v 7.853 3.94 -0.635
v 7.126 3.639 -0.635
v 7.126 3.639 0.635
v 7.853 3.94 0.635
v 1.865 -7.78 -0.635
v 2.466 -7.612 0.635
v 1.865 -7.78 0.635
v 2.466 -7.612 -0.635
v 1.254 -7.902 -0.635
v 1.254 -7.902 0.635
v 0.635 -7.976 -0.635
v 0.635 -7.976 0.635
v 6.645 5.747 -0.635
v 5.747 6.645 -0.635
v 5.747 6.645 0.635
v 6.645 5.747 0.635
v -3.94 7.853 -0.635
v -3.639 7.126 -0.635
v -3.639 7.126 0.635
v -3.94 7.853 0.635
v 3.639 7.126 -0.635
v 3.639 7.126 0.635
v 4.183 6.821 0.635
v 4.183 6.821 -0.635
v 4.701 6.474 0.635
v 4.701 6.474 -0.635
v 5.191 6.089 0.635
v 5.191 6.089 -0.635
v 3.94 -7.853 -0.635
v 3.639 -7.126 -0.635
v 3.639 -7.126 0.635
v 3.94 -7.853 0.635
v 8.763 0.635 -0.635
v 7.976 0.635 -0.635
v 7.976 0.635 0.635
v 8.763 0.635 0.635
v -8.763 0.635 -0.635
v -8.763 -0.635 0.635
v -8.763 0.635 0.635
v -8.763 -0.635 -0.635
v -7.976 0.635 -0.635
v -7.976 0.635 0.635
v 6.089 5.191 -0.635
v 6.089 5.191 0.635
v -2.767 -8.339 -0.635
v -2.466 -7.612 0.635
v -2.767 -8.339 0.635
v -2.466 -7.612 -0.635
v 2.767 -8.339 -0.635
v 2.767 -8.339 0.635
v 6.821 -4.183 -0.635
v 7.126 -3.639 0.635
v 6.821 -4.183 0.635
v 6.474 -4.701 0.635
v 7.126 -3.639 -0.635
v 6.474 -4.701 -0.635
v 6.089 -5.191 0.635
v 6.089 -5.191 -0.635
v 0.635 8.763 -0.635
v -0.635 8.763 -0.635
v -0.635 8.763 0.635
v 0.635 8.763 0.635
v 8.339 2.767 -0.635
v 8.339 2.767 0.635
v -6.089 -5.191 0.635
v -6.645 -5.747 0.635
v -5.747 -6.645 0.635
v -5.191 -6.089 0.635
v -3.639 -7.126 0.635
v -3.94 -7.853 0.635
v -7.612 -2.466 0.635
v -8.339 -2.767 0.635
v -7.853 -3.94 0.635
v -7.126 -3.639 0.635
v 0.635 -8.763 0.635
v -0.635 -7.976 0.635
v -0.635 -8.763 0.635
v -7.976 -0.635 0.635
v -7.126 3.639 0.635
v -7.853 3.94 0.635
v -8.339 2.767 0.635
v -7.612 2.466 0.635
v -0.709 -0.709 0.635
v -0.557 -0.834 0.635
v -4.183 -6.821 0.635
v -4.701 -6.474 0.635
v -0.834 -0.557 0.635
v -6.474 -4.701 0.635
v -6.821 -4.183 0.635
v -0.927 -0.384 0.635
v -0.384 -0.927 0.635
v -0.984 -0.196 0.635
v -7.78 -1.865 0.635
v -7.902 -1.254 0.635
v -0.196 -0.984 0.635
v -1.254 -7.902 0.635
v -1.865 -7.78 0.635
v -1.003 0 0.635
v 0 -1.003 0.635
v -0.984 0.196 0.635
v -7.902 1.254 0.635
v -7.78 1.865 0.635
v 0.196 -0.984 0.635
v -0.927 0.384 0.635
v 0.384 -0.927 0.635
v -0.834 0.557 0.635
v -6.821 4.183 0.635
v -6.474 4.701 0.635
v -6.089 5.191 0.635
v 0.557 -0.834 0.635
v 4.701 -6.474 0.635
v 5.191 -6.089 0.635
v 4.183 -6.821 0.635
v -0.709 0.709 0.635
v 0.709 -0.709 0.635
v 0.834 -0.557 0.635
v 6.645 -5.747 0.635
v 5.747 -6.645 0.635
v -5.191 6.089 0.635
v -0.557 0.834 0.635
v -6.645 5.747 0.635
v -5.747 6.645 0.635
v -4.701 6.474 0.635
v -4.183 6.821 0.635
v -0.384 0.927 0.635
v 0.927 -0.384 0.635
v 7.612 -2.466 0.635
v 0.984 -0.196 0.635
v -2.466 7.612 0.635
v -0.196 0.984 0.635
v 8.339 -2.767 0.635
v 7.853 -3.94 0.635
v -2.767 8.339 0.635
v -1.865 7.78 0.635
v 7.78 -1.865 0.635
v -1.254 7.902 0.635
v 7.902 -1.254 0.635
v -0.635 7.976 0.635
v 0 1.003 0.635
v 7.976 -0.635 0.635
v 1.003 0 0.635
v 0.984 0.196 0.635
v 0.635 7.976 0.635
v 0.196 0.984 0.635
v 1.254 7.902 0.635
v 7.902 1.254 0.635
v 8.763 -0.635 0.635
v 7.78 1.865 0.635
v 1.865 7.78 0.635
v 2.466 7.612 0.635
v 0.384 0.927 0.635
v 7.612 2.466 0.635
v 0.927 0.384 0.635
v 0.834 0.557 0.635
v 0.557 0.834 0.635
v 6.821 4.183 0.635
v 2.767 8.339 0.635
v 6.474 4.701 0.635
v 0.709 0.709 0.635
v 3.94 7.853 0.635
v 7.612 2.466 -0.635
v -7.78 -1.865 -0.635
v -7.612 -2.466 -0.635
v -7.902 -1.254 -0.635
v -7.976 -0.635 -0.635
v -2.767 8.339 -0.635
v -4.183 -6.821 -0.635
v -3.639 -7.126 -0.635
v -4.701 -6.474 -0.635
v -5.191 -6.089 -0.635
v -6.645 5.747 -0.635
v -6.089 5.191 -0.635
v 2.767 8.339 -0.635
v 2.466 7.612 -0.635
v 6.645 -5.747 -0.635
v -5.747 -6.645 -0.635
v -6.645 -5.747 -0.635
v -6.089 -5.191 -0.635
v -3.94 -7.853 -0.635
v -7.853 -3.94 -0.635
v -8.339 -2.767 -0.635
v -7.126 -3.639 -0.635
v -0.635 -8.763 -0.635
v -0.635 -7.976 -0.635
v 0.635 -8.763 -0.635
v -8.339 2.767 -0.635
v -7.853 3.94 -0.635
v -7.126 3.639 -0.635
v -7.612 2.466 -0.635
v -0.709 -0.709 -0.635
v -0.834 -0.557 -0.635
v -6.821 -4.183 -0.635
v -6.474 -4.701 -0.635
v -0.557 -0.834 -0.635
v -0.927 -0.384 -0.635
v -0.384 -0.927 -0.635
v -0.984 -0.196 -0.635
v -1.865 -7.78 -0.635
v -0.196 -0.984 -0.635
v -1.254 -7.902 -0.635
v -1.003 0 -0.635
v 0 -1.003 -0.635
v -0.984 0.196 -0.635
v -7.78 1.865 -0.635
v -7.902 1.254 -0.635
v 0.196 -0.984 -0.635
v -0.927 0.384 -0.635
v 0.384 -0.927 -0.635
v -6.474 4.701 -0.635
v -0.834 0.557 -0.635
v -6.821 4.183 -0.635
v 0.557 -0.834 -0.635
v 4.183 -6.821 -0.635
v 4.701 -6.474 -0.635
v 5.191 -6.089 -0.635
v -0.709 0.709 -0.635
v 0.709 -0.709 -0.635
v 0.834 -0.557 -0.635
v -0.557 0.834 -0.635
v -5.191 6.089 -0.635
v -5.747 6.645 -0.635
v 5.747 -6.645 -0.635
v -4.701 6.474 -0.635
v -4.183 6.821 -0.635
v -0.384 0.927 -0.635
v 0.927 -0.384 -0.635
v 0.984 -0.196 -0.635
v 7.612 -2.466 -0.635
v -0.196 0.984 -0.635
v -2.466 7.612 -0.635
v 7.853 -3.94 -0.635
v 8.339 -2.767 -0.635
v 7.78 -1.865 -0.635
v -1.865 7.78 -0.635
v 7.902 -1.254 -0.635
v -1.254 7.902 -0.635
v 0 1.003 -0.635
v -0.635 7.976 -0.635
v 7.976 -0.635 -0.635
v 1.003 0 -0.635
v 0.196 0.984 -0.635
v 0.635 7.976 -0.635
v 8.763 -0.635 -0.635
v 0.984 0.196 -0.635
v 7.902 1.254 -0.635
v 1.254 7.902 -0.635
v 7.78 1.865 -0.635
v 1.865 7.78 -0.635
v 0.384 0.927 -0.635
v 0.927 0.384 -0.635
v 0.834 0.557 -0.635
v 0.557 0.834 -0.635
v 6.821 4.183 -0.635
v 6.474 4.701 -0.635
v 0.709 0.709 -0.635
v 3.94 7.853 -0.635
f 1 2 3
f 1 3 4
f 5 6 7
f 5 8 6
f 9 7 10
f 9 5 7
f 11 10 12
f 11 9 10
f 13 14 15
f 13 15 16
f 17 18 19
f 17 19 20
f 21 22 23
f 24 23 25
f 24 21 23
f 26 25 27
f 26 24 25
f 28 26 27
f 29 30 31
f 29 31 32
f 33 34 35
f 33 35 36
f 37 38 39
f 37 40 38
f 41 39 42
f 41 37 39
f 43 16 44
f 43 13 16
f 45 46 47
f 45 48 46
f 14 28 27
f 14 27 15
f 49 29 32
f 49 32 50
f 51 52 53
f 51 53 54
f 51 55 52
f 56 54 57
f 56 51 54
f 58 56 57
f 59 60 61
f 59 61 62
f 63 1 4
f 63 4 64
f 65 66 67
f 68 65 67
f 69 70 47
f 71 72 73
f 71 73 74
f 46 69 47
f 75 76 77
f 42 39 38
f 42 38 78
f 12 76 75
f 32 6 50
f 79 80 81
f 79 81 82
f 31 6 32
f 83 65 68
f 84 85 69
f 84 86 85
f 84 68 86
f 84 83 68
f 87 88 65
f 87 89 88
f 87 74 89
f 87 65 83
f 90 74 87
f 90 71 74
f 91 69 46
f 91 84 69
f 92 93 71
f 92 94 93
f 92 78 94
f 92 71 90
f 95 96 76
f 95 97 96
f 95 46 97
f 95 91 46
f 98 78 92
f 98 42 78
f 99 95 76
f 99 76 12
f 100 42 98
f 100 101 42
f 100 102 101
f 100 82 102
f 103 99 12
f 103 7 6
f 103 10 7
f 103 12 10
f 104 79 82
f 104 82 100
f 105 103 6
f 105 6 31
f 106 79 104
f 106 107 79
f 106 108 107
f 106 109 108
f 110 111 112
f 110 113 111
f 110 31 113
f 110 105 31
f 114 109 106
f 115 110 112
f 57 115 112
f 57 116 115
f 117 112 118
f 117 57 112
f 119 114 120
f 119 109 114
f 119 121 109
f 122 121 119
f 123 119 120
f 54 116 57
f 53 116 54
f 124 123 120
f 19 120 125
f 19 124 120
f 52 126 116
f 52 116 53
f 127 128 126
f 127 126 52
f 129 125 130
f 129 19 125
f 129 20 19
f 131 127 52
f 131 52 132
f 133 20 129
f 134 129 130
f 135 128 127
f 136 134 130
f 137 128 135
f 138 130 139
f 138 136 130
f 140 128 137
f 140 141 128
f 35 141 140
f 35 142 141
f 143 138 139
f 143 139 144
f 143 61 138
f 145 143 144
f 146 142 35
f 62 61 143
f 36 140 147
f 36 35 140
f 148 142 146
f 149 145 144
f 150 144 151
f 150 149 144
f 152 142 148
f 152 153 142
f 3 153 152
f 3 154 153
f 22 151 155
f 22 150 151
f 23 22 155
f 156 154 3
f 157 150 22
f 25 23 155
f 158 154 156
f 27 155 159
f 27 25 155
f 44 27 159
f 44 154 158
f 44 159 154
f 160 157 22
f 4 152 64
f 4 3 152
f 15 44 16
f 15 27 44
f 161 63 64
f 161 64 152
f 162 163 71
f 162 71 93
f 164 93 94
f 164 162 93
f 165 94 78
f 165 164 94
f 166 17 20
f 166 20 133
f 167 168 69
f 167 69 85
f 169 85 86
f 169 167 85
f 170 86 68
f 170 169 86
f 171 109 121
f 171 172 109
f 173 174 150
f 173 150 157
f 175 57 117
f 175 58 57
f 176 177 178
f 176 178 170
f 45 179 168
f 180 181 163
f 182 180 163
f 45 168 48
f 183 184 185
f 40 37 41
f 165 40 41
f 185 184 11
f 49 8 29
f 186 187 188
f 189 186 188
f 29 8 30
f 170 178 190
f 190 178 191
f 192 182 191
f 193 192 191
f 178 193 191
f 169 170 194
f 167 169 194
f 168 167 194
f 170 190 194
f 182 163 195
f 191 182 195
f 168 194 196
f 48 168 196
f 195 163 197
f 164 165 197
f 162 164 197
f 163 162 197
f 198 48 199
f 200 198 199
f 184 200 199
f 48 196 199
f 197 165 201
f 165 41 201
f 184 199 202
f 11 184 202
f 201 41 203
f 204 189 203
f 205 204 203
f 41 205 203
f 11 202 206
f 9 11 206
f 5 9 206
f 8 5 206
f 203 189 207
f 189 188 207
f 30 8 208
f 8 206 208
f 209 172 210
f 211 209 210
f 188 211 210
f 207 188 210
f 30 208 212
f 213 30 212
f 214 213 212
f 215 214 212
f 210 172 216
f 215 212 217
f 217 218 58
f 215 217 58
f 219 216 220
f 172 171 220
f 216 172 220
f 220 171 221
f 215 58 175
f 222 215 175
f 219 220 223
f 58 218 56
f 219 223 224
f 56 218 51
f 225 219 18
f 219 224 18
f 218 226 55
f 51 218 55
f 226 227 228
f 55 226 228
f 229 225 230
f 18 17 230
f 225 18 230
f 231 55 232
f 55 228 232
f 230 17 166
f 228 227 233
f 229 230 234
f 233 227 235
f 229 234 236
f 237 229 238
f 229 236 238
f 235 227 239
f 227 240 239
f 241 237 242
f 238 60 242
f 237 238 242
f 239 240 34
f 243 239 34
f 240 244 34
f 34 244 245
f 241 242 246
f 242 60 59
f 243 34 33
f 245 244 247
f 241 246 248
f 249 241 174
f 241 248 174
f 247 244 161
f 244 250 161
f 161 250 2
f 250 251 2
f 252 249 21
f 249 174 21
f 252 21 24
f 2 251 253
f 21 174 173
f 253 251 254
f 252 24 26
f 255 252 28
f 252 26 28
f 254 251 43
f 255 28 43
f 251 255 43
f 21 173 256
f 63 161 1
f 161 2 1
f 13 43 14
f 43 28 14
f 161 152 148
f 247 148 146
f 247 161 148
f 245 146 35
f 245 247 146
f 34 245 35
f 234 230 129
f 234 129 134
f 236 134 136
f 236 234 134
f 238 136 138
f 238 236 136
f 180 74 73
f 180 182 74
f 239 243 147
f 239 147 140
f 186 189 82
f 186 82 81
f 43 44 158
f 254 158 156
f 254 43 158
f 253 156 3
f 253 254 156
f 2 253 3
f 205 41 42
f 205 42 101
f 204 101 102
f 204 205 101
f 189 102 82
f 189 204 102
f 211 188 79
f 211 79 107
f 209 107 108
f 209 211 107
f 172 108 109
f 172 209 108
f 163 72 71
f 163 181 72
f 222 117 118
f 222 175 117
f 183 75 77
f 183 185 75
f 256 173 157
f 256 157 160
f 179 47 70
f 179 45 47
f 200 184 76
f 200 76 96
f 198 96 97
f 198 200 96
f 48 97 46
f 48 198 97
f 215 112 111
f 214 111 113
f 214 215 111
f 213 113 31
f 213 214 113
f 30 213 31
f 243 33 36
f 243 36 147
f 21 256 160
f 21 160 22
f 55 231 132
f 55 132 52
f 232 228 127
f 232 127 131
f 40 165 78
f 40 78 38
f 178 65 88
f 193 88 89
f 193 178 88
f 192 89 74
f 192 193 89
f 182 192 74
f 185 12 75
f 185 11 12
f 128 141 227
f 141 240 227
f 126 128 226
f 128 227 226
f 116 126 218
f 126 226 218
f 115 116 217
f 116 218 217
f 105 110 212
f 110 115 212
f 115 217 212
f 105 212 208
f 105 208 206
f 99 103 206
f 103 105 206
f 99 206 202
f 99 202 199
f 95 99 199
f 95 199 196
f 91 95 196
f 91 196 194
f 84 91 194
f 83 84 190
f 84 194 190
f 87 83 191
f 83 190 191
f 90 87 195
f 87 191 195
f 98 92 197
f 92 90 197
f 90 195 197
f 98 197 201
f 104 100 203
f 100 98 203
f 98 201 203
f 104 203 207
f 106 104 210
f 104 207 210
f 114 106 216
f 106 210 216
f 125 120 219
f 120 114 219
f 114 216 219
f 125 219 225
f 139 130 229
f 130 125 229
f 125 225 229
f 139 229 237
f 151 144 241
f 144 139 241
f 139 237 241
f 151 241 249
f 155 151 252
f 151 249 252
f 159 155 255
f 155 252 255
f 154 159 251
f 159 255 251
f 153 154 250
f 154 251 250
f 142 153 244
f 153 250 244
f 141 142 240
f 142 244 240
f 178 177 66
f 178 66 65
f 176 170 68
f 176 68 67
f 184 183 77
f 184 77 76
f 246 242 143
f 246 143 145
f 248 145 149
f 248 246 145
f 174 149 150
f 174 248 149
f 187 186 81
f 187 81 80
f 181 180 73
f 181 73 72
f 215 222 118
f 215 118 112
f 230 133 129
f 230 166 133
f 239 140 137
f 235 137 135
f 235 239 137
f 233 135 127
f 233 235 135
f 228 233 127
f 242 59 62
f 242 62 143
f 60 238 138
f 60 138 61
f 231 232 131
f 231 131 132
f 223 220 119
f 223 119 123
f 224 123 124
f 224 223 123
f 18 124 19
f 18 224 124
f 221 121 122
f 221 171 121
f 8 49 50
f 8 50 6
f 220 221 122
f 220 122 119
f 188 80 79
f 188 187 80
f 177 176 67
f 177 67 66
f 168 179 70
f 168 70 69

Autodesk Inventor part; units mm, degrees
ref_plane "YZ Plane" through (0, 0, 0) normal (1, 0, 0) x (0, 1, 0)
ref_plane "XZ Plane" through (0, 0, 0) normal (0, 1, 0) x (-1, 0, 0)
ref_plane "XY Plane" through (0, 0, 0) normal (0, 0, 1) x (1, 0, 0)
sketch "Sketch1" plane through (0, 0, 0) normal (0, 0, 1) x (1, 0, 0)
  circle A0 centre (0, 0) radius 8.001
  line L0 (-0.635, 8.763) -> (0.635, 8.763)
  line L1 (0.635, 8.763) -> (0.635, 7.9758)
  line L2 (-0.635, 7.9758) -> (-0.635, 8.763)
  circle A1 centre (0, 0) radius 1.0033
  dimension "d0" = 0.762
  dimension "d2" = 0.635
  dimension "d3" = 0.635
  dimension "d4" = 16.002
  dimension "d5" = 2.0066
extrude "Extrusion1" add sketch "Sketch1" along normal mid plane 1.27 contours A0
extrude "Extrusion2" add sketch "Sketch1" along normal mid plane 1.27 contours A0 L2 L0 L1
pattern_circular "Circular Pattern1" count 16 over 360 about axis through (0, 0, 0) along (0, 0, 1) of "Extrusion2"
properties part number "Motor Gear" material "ABS Plastic"
